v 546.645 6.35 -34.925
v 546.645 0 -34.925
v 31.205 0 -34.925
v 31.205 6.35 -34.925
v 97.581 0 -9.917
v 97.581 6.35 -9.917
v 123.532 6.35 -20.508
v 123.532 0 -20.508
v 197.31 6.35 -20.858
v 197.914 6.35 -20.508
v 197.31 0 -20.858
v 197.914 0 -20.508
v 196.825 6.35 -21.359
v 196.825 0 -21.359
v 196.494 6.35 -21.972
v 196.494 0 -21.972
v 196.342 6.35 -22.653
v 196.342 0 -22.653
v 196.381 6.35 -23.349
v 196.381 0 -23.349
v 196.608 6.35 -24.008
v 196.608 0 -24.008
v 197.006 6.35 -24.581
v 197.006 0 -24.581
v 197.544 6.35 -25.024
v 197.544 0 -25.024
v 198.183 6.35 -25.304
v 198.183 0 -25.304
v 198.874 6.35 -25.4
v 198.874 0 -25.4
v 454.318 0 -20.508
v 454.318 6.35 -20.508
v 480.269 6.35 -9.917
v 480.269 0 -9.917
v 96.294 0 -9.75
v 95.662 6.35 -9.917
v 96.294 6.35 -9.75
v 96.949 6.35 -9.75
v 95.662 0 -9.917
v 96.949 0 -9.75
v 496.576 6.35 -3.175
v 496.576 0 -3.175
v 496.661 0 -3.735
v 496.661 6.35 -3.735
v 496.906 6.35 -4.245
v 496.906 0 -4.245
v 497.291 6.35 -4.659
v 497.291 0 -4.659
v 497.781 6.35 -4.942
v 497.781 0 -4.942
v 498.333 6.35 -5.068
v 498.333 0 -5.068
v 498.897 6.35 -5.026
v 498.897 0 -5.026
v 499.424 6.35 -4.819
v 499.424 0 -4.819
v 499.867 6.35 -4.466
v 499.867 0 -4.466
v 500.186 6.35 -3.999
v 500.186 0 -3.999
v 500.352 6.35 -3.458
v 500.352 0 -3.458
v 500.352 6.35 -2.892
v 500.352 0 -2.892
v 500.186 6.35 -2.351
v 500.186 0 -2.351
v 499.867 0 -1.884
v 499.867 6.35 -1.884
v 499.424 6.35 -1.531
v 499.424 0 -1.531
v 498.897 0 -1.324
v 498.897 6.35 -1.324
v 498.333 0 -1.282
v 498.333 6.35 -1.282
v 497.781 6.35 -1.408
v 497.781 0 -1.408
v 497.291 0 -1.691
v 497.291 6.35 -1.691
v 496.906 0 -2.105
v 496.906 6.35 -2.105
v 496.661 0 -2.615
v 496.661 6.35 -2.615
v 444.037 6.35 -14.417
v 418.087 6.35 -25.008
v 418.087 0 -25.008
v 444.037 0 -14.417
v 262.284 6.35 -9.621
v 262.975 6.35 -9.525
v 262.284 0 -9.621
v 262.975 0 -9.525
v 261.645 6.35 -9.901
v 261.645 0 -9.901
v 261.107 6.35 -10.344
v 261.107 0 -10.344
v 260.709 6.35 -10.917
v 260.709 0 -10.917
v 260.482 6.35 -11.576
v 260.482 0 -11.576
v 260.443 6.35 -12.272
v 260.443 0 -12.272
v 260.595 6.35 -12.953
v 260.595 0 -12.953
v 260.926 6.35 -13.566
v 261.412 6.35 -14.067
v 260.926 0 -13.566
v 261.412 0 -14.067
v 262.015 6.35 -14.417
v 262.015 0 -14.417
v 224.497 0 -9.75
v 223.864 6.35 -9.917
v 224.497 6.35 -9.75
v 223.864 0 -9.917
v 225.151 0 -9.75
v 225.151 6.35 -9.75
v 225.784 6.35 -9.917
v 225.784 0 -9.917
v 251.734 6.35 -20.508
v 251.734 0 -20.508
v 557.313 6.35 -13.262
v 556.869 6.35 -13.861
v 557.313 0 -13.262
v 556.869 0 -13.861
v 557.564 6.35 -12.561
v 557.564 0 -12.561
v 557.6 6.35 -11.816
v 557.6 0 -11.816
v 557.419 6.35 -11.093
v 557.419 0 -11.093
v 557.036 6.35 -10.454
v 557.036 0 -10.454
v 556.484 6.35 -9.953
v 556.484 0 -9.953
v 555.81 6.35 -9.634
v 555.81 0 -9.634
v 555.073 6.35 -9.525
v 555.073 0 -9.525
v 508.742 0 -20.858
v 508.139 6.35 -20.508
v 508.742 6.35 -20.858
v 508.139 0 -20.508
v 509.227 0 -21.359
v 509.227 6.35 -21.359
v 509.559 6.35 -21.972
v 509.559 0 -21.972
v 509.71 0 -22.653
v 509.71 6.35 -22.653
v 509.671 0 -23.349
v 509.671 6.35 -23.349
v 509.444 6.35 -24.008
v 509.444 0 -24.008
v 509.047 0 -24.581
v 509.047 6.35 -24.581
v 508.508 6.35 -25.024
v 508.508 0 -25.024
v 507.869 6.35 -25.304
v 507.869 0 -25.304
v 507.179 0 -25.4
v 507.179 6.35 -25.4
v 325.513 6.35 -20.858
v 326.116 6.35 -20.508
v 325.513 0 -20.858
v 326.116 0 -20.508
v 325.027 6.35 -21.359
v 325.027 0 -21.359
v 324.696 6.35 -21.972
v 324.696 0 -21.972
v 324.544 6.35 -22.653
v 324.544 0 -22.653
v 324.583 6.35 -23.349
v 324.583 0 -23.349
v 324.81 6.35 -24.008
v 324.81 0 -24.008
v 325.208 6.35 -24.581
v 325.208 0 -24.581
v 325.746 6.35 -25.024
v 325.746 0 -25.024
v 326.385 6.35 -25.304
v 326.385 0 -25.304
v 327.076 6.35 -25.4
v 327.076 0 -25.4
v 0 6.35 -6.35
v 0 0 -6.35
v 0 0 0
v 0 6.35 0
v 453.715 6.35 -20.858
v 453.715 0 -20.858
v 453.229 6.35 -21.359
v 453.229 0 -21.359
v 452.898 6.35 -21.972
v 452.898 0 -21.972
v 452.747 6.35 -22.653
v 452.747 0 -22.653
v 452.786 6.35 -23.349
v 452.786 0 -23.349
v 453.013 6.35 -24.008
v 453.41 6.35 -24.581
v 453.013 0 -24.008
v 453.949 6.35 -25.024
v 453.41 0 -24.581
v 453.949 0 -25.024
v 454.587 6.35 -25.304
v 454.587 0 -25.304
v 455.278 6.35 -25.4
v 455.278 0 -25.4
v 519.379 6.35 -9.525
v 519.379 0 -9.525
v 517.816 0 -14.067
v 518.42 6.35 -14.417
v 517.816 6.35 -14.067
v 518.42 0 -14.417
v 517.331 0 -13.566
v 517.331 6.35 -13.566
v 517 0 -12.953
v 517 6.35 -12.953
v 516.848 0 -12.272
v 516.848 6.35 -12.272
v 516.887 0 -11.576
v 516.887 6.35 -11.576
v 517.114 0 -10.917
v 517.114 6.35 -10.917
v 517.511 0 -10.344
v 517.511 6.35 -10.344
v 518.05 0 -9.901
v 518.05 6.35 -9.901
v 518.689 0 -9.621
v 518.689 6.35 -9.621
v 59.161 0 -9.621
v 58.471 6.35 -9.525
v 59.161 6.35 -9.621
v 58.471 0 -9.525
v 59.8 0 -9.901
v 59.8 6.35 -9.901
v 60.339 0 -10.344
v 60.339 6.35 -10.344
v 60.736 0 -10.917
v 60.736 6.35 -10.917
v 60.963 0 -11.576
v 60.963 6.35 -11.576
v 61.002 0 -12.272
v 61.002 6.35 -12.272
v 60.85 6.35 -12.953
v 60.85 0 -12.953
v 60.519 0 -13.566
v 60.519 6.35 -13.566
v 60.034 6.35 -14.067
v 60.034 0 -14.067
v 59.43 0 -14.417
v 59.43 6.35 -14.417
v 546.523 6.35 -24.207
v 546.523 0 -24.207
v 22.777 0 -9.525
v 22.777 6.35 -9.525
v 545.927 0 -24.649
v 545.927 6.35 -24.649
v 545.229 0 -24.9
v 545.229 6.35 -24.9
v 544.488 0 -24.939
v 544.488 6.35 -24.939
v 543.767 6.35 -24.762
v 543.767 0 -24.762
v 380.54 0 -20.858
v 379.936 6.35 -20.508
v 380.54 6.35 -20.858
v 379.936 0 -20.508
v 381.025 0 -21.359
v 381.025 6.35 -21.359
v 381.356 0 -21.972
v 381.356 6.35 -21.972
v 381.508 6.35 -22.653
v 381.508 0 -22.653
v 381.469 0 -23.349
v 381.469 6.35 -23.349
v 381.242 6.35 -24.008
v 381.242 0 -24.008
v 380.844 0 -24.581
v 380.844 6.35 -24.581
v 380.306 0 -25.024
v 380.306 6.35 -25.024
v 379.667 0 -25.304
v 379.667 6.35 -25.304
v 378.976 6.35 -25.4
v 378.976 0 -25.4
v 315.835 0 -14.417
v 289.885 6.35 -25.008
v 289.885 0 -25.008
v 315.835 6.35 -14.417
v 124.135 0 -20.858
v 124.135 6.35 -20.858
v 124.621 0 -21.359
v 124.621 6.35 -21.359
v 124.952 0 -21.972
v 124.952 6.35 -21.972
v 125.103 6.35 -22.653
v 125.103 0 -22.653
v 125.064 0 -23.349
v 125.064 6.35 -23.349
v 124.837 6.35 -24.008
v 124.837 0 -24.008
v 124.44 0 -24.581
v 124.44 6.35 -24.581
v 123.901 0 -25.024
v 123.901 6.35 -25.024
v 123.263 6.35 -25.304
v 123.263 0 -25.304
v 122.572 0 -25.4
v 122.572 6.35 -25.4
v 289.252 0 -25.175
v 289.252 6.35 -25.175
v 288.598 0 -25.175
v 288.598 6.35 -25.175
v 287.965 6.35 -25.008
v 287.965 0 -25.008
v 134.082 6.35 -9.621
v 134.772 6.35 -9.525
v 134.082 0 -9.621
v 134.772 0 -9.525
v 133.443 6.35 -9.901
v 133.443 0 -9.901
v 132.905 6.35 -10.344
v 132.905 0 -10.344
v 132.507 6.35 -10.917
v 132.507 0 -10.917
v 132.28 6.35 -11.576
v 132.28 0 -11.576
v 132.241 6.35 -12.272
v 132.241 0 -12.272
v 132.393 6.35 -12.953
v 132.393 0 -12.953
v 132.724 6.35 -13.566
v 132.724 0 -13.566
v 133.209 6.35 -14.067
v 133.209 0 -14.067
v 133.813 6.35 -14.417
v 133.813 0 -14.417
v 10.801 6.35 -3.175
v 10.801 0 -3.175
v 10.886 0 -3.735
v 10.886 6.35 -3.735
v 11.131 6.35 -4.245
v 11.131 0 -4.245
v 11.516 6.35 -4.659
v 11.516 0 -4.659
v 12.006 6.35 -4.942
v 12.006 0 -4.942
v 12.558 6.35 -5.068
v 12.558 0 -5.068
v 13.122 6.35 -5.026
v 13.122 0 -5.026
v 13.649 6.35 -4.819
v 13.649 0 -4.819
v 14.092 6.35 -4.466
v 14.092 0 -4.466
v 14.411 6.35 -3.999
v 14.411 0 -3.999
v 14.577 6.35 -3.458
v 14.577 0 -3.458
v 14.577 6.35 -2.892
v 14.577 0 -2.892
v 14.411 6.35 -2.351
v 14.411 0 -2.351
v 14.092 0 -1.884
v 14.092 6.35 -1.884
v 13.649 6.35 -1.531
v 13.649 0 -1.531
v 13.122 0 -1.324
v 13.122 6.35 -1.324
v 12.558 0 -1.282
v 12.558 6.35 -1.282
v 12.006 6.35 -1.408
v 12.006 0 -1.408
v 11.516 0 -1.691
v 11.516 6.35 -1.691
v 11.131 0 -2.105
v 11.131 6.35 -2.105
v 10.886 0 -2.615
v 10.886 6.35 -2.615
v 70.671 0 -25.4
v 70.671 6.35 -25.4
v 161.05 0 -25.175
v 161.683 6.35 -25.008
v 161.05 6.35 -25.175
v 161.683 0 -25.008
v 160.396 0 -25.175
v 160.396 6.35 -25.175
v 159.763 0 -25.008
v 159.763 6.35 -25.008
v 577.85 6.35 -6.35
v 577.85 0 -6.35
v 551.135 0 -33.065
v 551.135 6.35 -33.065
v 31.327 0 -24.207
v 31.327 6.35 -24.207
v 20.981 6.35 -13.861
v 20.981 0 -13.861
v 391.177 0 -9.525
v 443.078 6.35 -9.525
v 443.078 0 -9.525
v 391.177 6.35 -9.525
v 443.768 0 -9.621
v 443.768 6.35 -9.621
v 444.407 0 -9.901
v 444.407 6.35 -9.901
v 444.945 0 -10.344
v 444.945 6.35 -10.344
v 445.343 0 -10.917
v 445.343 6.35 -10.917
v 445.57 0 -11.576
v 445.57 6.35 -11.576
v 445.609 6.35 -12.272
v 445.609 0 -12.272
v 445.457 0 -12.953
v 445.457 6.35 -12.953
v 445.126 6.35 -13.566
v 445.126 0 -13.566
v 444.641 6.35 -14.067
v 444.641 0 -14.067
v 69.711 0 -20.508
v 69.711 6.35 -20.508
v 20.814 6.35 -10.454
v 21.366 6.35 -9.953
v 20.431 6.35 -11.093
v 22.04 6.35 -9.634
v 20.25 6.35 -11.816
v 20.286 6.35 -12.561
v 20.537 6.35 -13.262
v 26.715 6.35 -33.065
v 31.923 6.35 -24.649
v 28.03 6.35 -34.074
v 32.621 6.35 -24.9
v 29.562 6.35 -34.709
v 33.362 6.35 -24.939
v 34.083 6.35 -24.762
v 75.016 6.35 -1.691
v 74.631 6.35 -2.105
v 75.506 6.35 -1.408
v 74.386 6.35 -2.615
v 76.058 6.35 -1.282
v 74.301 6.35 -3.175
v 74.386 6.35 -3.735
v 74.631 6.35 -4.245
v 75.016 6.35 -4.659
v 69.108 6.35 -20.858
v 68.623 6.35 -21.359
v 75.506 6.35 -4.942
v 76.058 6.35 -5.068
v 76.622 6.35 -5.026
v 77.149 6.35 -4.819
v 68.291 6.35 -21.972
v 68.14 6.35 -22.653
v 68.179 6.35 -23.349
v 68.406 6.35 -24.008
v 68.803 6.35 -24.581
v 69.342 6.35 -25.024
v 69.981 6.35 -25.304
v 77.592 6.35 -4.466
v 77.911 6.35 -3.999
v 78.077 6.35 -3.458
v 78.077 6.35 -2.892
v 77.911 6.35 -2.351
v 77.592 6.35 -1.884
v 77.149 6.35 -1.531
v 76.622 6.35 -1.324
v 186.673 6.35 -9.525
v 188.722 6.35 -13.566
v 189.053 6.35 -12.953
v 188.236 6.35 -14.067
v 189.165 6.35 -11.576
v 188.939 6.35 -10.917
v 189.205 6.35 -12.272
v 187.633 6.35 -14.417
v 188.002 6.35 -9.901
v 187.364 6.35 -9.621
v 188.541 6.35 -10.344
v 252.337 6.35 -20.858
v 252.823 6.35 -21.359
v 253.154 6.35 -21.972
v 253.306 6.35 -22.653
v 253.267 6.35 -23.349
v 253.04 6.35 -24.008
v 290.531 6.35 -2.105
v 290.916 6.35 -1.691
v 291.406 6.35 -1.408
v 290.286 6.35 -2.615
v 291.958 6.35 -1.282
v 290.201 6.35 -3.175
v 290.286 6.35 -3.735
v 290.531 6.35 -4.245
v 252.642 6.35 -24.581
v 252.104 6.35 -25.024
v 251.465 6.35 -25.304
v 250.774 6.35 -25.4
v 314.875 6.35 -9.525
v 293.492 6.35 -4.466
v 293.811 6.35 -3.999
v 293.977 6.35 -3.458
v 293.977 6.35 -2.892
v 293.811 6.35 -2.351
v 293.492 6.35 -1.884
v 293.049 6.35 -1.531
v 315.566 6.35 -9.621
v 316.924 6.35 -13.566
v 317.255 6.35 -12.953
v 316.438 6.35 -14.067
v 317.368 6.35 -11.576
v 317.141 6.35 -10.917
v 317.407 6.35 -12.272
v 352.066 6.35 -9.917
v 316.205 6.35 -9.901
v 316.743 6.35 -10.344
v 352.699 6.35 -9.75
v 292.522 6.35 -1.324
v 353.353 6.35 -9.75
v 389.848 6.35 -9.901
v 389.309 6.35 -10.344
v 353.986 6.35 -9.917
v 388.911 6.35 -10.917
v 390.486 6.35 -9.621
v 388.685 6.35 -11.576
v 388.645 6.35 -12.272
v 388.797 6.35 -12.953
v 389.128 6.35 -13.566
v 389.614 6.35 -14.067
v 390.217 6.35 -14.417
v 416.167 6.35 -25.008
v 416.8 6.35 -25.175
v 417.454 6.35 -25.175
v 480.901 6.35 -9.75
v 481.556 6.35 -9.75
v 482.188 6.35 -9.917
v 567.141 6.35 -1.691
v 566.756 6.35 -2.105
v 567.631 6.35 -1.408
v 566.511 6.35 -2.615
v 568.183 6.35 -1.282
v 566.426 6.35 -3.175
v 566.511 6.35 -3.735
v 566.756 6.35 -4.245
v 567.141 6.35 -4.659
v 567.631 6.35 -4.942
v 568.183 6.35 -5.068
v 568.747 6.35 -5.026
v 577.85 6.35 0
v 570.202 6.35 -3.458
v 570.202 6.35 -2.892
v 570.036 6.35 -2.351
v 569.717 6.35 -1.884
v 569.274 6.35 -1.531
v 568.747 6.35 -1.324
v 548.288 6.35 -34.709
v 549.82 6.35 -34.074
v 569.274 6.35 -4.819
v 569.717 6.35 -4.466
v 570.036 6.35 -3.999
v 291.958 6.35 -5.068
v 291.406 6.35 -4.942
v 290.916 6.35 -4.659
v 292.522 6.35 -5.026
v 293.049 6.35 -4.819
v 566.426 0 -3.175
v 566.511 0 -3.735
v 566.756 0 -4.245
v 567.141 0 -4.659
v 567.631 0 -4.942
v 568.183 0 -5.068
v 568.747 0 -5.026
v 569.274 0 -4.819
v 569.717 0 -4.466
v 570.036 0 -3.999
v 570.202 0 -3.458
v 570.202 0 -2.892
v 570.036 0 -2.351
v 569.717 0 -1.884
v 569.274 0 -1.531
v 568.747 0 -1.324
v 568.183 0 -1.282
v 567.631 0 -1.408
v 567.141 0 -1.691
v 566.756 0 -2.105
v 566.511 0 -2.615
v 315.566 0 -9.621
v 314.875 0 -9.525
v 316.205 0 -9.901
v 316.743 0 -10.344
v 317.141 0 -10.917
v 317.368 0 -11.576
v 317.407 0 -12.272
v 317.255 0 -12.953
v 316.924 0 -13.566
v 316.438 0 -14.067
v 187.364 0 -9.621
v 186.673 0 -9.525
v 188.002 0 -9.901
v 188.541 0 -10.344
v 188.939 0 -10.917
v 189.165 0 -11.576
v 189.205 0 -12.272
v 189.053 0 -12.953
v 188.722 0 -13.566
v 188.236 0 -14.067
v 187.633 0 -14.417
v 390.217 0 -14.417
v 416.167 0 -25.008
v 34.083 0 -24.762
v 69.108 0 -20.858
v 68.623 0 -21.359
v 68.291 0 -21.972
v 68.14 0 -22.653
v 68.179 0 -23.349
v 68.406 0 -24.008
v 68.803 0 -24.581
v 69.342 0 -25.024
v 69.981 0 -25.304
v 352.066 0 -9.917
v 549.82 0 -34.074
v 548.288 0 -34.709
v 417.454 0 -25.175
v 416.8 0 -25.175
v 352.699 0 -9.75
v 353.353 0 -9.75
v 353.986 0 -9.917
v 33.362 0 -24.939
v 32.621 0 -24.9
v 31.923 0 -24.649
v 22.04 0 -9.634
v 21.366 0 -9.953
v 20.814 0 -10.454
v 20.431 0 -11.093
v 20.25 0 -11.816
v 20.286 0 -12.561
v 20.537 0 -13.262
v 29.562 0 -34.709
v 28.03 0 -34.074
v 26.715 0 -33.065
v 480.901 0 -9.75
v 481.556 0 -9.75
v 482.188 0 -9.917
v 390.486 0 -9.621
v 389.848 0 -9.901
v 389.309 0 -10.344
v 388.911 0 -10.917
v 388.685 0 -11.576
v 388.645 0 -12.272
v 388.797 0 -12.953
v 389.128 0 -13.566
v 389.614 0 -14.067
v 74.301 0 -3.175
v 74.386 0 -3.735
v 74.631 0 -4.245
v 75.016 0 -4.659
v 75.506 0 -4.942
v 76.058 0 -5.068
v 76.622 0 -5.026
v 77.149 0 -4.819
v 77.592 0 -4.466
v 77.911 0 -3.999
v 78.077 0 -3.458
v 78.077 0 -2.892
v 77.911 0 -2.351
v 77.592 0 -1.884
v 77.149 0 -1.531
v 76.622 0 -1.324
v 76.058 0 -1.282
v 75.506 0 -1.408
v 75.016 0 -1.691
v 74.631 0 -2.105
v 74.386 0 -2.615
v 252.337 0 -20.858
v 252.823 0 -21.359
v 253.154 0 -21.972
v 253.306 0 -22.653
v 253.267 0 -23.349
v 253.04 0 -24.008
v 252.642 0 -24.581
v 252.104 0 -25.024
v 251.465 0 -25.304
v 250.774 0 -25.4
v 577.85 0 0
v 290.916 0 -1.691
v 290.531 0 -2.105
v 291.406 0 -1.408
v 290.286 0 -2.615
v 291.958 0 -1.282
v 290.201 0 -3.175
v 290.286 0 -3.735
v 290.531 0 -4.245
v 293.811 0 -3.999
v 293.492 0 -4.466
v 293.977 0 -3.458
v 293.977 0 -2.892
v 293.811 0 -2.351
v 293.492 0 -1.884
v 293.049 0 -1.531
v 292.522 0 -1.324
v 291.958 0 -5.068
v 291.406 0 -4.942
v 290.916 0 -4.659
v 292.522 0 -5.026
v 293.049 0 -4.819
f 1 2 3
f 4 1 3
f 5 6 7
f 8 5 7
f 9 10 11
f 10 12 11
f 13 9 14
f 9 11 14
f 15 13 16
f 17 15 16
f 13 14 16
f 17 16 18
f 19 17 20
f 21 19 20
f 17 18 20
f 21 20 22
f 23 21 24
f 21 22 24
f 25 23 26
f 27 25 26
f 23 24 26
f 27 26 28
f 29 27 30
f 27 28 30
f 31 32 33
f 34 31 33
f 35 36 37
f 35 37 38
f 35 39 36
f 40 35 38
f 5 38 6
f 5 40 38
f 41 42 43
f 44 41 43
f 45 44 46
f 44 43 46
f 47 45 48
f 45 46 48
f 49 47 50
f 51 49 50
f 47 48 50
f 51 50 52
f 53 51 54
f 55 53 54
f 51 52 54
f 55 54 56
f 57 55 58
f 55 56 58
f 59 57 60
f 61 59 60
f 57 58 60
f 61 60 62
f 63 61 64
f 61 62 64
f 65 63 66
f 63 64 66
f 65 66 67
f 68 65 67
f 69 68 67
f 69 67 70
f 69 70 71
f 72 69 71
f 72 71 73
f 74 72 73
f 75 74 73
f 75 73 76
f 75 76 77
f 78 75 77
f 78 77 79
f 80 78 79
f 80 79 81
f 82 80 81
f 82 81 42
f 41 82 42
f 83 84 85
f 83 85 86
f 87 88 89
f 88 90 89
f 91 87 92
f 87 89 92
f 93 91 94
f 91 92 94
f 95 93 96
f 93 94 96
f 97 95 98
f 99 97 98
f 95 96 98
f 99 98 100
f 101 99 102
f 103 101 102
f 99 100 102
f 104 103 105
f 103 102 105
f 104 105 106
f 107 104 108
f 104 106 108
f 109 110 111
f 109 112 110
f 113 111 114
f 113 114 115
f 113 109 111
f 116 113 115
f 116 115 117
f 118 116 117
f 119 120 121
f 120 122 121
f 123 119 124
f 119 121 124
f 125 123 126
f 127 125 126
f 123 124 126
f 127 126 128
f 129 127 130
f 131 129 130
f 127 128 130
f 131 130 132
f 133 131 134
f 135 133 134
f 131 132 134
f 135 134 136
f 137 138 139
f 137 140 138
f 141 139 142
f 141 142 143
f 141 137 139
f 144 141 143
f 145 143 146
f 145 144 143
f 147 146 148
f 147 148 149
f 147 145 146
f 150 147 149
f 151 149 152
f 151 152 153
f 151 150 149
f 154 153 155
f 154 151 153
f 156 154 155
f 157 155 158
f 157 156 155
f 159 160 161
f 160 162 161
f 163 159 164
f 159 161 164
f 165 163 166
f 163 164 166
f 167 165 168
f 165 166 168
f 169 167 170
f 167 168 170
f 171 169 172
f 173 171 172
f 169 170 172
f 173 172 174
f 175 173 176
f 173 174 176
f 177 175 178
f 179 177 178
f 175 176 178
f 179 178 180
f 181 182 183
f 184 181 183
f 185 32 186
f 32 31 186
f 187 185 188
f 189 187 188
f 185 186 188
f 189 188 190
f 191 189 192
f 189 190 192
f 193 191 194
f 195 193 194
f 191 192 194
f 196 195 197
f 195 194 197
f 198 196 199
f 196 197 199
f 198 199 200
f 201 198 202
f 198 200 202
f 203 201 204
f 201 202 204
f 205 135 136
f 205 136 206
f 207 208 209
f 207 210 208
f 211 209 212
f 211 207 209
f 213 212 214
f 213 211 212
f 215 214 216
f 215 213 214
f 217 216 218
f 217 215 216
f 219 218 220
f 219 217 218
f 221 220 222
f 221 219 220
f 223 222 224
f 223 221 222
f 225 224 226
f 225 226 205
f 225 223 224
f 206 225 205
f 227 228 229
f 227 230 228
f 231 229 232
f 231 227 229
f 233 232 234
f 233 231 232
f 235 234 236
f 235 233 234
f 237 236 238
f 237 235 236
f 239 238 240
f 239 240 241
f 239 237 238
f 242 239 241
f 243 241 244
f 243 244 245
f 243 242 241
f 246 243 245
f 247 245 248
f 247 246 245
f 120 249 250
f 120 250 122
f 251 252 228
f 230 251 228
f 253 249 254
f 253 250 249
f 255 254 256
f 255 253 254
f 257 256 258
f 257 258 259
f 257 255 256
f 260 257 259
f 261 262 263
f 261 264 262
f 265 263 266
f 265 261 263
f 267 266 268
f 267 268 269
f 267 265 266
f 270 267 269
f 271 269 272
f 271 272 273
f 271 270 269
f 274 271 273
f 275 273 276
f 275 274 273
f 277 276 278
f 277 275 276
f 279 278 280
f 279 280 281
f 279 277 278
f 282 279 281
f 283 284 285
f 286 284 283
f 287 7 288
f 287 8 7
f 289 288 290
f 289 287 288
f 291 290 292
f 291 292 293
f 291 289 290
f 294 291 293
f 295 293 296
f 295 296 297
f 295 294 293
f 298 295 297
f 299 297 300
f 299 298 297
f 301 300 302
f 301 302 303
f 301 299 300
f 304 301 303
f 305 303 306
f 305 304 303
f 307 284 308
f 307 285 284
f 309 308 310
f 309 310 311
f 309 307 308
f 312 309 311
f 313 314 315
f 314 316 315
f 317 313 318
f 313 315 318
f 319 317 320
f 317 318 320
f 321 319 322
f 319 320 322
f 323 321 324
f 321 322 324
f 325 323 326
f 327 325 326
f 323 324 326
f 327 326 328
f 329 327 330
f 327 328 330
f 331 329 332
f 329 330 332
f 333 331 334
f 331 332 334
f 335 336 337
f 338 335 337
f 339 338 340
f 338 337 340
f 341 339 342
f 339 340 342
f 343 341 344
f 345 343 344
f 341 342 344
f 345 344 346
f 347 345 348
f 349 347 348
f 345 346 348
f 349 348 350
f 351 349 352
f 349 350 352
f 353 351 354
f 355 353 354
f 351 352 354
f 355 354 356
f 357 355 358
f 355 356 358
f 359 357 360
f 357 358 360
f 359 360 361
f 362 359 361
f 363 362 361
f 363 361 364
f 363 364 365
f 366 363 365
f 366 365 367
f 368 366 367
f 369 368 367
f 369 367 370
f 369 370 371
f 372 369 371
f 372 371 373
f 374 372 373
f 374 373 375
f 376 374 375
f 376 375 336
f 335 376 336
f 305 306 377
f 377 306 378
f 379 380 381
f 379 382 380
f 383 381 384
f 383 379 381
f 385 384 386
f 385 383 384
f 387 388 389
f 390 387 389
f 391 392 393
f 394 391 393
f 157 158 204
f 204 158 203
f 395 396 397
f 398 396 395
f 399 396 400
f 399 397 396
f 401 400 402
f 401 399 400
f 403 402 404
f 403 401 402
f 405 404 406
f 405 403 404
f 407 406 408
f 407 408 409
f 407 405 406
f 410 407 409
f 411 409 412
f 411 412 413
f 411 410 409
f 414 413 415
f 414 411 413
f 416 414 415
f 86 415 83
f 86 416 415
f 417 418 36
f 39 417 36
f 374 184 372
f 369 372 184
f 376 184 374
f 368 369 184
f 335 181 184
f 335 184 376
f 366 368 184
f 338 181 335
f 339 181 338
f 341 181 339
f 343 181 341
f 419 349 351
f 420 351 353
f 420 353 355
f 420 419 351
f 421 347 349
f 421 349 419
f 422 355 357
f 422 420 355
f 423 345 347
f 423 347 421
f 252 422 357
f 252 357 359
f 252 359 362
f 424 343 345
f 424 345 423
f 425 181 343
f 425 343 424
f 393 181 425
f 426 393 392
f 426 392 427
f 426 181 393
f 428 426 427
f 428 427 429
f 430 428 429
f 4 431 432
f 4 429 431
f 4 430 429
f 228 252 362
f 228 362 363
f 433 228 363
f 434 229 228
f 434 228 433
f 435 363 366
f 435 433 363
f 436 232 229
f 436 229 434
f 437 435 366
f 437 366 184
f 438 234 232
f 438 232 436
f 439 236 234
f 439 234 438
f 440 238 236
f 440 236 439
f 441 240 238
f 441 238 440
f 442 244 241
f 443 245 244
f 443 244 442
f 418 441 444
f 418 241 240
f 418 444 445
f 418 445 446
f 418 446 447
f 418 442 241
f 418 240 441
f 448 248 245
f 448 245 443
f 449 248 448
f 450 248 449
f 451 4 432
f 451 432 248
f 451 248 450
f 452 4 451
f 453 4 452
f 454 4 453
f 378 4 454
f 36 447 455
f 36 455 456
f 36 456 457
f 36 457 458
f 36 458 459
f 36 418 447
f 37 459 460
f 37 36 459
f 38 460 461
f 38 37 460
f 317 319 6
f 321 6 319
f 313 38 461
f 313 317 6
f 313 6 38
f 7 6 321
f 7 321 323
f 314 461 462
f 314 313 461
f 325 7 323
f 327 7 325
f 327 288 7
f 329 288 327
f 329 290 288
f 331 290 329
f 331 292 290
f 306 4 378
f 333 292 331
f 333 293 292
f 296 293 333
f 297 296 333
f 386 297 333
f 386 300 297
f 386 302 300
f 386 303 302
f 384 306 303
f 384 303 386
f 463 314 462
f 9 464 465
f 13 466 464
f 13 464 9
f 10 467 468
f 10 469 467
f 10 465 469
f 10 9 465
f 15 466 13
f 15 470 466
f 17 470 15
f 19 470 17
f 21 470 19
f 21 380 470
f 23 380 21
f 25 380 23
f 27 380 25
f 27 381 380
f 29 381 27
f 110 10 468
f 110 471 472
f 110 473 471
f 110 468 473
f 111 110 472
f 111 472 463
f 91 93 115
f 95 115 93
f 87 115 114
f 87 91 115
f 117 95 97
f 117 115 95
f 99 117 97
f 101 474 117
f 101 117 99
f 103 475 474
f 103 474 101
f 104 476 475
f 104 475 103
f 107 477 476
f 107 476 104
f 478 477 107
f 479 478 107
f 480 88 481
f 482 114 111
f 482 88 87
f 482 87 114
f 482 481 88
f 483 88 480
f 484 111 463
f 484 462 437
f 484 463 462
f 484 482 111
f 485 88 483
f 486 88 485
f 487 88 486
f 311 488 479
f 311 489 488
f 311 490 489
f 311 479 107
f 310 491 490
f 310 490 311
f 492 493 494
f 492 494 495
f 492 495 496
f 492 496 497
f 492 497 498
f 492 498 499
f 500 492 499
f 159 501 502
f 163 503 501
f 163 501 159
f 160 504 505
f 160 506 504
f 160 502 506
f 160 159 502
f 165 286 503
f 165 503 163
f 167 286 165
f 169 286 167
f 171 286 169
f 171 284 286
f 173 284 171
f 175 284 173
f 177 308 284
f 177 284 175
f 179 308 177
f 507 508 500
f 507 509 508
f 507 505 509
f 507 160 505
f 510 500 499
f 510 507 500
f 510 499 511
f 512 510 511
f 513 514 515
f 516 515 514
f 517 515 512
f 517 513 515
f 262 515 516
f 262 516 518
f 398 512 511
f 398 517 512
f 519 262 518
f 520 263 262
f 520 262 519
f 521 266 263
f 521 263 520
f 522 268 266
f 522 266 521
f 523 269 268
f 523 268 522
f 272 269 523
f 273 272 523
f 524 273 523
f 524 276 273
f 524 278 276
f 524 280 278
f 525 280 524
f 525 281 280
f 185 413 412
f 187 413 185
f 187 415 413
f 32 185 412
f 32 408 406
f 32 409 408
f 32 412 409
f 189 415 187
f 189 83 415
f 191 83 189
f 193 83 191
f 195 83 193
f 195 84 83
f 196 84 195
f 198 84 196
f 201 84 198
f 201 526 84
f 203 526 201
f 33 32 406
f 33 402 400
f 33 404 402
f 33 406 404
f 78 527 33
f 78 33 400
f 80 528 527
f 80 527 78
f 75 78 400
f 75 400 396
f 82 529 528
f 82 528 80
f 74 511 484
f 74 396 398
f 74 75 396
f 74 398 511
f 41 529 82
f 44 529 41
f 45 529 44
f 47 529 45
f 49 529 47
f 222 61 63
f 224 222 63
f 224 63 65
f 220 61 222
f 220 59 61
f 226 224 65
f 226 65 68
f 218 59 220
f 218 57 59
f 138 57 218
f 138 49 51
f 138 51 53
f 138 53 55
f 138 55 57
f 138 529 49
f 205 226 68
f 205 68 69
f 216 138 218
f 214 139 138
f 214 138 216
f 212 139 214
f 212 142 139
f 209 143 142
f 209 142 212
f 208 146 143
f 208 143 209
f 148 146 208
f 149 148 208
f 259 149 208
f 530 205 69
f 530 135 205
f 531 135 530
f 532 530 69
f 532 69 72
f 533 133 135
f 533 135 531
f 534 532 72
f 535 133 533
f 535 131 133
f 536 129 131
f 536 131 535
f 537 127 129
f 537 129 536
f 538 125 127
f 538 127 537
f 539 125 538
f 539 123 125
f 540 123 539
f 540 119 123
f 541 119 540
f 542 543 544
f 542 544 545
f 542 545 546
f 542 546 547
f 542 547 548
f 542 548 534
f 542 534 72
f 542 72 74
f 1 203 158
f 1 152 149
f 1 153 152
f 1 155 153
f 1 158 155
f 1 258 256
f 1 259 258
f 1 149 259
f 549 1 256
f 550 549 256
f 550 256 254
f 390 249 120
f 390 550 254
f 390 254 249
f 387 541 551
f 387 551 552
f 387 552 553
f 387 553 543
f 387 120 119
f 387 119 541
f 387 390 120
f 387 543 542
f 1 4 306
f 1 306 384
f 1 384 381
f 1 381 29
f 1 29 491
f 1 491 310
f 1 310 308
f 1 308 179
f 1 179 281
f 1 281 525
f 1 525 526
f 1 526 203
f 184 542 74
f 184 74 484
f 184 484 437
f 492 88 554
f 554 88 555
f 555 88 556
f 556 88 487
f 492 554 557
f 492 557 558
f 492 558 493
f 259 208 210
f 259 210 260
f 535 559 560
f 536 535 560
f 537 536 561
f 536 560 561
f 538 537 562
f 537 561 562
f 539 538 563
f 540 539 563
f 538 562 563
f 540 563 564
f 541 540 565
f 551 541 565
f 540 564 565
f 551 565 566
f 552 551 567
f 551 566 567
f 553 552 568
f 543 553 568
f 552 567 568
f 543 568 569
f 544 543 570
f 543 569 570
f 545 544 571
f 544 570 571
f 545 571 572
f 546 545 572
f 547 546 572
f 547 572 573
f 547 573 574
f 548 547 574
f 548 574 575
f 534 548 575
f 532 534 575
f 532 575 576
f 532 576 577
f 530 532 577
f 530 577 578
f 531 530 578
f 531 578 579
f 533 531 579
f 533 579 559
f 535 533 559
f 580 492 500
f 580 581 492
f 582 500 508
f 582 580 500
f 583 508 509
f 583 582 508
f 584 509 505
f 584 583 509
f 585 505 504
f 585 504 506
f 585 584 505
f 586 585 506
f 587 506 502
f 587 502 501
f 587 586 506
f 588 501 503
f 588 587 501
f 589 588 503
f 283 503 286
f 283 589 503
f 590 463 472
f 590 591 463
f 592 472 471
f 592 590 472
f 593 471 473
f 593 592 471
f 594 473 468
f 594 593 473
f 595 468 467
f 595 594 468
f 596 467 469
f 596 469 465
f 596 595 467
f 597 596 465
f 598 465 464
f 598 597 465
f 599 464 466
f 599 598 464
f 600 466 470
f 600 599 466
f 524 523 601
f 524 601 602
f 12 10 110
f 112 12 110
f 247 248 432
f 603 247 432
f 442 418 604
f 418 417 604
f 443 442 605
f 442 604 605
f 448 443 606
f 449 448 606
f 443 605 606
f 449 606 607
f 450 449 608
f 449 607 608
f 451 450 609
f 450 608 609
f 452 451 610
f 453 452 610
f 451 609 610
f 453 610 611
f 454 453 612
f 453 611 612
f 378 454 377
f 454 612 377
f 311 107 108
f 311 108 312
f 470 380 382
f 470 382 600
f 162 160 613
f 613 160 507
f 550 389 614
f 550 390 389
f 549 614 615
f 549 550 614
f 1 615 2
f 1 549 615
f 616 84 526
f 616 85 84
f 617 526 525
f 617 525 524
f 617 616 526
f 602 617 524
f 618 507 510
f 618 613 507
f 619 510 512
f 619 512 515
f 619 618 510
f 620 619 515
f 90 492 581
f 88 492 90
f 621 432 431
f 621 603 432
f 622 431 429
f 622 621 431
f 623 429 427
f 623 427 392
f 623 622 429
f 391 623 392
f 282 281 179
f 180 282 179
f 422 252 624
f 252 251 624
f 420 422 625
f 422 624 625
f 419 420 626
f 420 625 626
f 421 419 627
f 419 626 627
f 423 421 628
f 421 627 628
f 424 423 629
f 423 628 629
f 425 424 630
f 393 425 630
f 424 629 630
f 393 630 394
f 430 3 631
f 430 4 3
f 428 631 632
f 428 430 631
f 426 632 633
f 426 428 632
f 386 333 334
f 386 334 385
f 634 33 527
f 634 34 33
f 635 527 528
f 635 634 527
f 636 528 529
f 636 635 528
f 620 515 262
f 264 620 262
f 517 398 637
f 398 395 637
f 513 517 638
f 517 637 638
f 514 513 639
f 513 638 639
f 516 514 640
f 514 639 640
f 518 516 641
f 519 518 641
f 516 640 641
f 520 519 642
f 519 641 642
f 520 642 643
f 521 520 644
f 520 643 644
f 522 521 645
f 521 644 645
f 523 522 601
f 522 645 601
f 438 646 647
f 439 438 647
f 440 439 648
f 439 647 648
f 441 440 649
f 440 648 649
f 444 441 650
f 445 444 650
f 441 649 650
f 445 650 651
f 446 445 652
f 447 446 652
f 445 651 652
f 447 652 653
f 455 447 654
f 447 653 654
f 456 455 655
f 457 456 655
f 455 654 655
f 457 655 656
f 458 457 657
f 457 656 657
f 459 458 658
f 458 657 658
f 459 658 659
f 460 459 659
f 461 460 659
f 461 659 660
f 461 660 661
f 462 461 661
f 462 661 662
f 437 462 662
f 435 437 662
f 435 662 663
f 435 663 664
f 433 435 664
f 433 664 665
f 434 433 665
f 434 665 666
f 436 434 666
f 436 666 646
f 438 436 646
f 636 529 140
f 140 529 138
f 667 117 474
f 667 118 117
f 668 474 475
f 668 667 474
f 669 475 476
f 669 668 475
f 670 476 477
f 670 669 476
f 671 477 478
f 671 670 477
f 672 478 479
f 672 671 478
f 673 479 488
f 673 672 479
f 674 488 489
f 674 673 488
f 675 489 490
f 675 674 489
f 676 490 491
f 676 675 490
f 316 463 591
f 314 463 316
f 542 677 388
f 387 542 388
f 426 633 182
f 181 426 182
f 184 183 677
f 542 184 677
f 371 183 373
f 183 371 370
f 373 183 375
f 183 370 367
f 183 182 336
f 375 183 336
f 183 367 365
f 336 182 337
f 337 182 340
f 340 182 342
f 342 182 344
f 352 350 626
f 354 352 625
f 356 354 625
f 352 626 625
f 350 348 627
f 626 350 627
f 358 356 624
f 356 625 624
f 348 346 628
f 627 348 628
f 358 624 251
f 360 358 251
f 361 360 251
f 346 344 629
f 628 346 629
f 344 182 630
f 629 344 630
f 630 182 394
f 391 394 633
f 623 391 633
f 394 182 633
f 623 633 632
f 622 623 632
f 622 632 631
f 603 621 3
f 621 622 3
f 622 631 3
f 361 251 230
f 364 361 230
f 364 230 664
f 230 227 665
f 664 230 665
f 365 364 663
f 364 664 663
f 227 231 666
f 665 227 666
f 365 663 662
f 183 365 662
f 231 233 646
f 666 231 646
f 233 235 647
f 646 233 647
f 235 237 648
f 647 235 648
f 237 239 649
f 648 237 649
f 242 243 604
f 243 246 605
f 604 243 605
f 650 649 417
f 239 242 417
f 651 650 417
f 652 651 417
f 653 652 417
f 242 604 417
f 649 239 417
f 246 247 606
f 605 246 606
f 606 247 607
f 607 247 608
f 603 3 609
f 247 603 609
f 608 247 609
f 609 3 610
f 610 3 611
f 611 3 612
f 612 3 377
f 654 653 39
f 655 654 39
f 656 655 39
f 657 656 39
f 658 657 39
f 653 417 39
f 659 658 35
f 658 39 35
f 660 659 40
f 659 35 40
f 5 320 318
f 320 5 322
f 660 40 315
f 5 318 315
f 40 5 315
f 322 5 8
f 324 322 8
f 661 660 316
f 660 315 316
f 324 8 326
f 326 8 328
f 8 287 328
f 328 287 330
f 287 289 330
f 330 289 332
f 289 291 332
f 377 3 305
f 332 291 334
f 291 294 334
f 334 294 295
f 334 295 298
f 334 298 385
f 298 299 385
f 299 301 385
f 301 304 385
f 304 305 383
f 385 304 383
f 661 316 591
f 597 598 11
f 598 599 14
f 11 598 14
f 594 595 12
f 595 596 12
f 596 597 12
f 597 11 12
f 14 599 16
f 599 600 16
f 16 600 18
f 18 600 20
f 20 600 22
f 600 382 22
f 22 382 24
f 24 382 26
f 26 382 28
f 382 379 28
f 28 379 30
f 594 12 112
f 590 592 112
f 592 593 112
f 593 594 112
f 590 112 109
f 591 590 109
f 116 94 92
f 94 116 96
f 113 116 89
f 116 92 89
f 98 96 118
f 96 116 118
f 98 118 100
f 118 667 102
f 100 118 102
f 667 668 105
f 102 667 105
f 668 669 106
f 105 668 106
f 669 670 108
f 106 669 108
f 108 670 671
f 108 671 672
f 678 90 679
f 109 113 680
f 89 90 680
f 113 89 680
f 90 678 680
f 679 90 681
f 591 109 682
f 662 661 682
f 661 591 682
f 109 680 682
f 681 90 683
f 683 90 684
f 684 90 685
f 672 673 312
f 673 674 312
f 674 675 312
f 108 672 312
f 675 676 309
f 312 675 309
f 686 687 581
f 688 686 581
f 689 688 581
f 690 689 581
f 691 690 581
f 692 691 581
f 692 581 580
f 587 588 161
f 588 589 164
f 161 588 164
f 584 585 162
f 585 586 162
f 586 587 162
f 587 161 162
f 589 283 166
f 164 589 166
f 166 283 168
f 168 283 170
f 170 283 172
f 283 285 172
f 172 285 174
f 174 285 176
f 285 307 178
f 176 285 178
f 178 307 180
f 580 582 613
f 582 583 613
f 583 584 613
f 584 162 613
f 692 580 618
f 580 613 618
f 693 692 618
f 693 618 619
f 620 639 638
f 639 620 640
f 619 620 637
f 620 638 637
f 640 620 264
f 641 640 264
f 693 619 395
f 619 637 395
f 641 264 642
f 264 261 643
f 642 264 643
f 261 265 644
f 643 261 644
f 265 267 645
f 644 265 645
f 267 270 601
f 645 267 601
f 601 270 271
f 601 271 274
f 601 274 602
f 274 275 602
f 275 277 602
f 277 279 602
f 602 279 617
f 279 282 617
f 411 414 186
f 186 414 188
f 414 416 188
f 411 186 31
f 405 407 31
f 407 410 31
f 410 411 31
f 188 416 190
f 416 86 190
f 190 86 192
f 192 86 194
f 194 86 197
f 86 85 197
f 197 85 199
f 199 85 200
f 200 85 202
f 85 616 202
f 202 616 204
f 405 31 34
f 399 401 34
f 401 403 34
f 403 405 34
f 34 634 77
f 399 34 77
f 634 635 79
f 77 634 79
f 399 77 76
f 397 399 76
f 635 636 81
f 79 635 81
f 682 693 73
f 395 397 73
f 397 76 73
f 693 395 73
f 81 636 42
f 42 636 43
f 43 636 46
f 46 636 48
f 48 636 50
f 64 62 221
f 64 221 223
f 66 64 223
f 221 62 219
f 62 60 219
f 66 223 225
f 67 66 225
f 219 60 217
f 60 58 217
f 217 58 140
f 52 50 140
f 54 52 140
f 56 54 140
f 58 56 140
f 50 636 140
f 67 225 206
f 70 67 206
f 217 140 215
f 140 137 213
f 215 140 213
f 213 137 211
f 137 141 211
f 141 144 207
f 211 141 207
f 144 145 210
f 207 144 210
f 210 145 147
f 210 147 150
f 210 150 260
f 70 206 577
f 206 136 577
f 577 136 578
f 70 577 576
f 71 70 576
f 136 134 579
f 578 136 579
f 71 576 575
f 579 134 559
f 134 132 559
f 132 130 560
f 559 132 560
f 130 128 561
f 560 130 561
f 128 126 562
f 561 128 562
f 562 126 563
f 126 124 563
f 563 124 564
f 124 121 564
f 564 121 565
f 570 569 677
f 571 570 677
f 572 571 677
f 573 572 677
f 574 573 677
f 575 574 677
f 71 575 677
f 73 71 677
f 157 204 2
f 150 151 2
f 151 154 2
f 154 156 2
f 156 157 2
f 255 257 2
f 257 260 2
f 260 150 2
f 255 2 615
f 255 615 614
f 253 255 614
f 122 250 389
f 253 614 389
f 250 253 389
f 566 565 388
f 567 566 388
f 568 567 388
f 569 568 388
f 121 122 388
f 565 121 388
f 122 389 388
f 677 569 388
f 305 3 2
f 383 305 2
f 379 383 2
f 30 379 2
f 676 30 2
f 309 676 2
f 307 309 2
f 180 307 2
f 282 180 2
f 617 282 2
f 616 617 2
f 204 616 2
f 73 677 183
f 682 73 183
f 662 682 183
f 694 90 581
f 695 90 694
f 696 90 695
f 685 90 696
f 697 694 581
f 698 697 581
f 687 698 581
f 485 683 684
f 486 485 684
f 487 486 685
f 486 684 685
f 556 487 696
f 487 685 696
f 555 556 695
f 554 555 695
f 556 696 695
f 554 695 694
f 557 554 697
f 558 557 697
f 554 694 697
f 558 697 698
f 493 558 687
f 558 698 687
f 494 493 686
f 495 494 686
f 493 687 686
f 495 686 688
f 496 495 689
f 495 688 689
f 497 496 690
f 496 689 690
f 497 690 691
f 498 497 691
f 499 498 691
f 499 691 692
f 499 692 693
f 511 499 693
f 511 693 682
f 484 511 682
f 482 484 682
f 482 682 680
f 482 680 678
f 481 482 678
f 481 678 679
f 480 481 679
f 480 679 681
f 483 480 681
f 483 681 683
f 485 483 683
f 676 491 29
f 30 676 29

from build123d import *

# Parameters (mm, degrees)
BOSS_EXTRUDE1_DEPTH       = 6.35
FILLET1_R                 = 6.35
CUT_EXTRUDE1_DEPTH        = 6.35
FILLET2_R                 = 2.54
F_6_CLEARANCE_HOLE1_D     = 3.7973
F_6_CLEARANCE_HOLE1_DEPTH = 12.7
F_6_CLEARANCE_HOLE1_TIP   = 1.140824014


with BuildPart() as part:
    # Sketch1 → Boss-Extrude1 (new body)
    with BuildSketch(Plane(origin=(0, 0, 0), x_dir=(1, 0, 0), z_dir=(0, 1, 0))):
        Polygon((0, 6.35), (0, 0), (577.85, 0), (577.85, 6.35), (549.275, 34.925), (28.575, 34.925), align=None)
    extrude(amount=BOSS_EXTRUDE1_DEPTH)

    # Fillet1
    fillet1_edges = [part.edges().sort_by_distance(p)[0] for p in [
        (549.275, 3.175, -34.925),
        (28.575, 3.175, -34.925),
    ]]
    fillet(fillet1_edges, radius=FILLET1_R)

    # Sketch2 → Cut-Extrude1 (cut)
    with BuildSketch(Plane(origin=(0, 6.35, 0), x_dir=(1, 0, 0), z_dir=(0, 1, 0))):
        Polygon((16.645384182, 9.525), (71.415498994, 9.525), (32.520384182, 25.4), align=None)
        Polygon((57.726423324, 25.4), (96.621538136, 9.525), (135.516652948, 25.4), align=None)
        Polygon((121.827577279, 9.525), (160.722692091, 25.4), (199.617806903, 9.525), align=None)
        Polygon((185.928731233, 25.4), (224.823846045, 9.525), (263.718960858, 25.4), align=None)
        Polygon((250.029885188, 9.525), (288.925, 25.4), (327.820114812, 9.525), align=None)
        Polygon((314.131039142, 25.4), (353.026153955, 9.525), (391.921268767, 25.4), align=None)
        Polygon((378.232193097, 9.525), (417.127307909, 25.4), (456.022422721, 9.525), align=None)
        Polygon((442.333347052, 25.4), (481.228461864, 9.525), (520.123576676, 25.4), align=None)
        Polygon((561.204615818, 9.525), (506.434501006, 9.525), (545.329615818, 25.4), align=None)
    extrude(amount=-CUT_EXTRUDE1_DEPTH, mode=Mode.SUBTRACT)

    # Fillet2
    fillet2_edges = [part.edges().sort_by_distance(p)[0] for p in [
        (545.329615818, 3.175, -25.4),
        (442.333347052, 3.175, -25.4),
        (391.921268767, 3.175, -25.4),
        (417.127307909, 3.175, -25.4),
        (288.925, 3.175, -25.4),
        (314.131039142, 3.175, -25.4),
        (185.928731233, 3.175, -25.4),
        (263.718960858, 3.175, -25.4),
        (520.123576676, 3.175, -25.4),
        (481.228461864, 3.175, -9.525),
        (353.026153955, 3.175, -9.525),
        (224.823846045, 3.175, -9.525),
        (250.029885188, 3.175, -9.525),
        (378.232193097, 3.175, -9.525),
        (506.434501006, 3.175, -9.525),
        (561.204615818, 3.175, -9.525),
        (456.022422721, 3.175, -9.525),
        (327.820114812, 3.175, -9.525),
        (199.617806903, 3.175, -9.525),
        (121.827577279, 3.175, -9.525),
        (160.722692091, 3.175, -25.4),
        (135.516652948, 3.175, -25.4),
        (57.726423324, 3.175, -25.4),
        (96.621538136, 3.175, -9.525),
        (71.415498994, 3.175, -9.525),
        (32.520384182, 3.175, -25.4),
        (16.645384182, 3.175, -9.525),
    ]]
    fillet(fillet2_edges, radius=FILLET2_R)

    # #6 Clearance Hole1
    with Locations(Plane(origin=(0, 6.35, 0), x_dir=(1, 0, 0), z_dir=(0, 1, 0))):
        with Locations((12.7, 3.175), (76.2, 3.175), (292.1, 3.175), (568.325, 3.175), (498.475, 3.175)):
            Hole(F_6_CLEARANCE_HOLE1_D / 2, depth=F_6_CLEARANCE_HOLE1_DEPTH)
            with Locations((0, 0, -(F_6_CLEARANCE_HOLE1_DEPTH + F_6_CLEARANCE_HOLE1_TIP / 2))):  # 118° drill point
                Cone(0, F_6_CLEARANCE_HOLE1_D / 2, F_6_CLEARANCE_HOLE1_TIP, mode=Mode.SUBTRACT)


solid = part.part
